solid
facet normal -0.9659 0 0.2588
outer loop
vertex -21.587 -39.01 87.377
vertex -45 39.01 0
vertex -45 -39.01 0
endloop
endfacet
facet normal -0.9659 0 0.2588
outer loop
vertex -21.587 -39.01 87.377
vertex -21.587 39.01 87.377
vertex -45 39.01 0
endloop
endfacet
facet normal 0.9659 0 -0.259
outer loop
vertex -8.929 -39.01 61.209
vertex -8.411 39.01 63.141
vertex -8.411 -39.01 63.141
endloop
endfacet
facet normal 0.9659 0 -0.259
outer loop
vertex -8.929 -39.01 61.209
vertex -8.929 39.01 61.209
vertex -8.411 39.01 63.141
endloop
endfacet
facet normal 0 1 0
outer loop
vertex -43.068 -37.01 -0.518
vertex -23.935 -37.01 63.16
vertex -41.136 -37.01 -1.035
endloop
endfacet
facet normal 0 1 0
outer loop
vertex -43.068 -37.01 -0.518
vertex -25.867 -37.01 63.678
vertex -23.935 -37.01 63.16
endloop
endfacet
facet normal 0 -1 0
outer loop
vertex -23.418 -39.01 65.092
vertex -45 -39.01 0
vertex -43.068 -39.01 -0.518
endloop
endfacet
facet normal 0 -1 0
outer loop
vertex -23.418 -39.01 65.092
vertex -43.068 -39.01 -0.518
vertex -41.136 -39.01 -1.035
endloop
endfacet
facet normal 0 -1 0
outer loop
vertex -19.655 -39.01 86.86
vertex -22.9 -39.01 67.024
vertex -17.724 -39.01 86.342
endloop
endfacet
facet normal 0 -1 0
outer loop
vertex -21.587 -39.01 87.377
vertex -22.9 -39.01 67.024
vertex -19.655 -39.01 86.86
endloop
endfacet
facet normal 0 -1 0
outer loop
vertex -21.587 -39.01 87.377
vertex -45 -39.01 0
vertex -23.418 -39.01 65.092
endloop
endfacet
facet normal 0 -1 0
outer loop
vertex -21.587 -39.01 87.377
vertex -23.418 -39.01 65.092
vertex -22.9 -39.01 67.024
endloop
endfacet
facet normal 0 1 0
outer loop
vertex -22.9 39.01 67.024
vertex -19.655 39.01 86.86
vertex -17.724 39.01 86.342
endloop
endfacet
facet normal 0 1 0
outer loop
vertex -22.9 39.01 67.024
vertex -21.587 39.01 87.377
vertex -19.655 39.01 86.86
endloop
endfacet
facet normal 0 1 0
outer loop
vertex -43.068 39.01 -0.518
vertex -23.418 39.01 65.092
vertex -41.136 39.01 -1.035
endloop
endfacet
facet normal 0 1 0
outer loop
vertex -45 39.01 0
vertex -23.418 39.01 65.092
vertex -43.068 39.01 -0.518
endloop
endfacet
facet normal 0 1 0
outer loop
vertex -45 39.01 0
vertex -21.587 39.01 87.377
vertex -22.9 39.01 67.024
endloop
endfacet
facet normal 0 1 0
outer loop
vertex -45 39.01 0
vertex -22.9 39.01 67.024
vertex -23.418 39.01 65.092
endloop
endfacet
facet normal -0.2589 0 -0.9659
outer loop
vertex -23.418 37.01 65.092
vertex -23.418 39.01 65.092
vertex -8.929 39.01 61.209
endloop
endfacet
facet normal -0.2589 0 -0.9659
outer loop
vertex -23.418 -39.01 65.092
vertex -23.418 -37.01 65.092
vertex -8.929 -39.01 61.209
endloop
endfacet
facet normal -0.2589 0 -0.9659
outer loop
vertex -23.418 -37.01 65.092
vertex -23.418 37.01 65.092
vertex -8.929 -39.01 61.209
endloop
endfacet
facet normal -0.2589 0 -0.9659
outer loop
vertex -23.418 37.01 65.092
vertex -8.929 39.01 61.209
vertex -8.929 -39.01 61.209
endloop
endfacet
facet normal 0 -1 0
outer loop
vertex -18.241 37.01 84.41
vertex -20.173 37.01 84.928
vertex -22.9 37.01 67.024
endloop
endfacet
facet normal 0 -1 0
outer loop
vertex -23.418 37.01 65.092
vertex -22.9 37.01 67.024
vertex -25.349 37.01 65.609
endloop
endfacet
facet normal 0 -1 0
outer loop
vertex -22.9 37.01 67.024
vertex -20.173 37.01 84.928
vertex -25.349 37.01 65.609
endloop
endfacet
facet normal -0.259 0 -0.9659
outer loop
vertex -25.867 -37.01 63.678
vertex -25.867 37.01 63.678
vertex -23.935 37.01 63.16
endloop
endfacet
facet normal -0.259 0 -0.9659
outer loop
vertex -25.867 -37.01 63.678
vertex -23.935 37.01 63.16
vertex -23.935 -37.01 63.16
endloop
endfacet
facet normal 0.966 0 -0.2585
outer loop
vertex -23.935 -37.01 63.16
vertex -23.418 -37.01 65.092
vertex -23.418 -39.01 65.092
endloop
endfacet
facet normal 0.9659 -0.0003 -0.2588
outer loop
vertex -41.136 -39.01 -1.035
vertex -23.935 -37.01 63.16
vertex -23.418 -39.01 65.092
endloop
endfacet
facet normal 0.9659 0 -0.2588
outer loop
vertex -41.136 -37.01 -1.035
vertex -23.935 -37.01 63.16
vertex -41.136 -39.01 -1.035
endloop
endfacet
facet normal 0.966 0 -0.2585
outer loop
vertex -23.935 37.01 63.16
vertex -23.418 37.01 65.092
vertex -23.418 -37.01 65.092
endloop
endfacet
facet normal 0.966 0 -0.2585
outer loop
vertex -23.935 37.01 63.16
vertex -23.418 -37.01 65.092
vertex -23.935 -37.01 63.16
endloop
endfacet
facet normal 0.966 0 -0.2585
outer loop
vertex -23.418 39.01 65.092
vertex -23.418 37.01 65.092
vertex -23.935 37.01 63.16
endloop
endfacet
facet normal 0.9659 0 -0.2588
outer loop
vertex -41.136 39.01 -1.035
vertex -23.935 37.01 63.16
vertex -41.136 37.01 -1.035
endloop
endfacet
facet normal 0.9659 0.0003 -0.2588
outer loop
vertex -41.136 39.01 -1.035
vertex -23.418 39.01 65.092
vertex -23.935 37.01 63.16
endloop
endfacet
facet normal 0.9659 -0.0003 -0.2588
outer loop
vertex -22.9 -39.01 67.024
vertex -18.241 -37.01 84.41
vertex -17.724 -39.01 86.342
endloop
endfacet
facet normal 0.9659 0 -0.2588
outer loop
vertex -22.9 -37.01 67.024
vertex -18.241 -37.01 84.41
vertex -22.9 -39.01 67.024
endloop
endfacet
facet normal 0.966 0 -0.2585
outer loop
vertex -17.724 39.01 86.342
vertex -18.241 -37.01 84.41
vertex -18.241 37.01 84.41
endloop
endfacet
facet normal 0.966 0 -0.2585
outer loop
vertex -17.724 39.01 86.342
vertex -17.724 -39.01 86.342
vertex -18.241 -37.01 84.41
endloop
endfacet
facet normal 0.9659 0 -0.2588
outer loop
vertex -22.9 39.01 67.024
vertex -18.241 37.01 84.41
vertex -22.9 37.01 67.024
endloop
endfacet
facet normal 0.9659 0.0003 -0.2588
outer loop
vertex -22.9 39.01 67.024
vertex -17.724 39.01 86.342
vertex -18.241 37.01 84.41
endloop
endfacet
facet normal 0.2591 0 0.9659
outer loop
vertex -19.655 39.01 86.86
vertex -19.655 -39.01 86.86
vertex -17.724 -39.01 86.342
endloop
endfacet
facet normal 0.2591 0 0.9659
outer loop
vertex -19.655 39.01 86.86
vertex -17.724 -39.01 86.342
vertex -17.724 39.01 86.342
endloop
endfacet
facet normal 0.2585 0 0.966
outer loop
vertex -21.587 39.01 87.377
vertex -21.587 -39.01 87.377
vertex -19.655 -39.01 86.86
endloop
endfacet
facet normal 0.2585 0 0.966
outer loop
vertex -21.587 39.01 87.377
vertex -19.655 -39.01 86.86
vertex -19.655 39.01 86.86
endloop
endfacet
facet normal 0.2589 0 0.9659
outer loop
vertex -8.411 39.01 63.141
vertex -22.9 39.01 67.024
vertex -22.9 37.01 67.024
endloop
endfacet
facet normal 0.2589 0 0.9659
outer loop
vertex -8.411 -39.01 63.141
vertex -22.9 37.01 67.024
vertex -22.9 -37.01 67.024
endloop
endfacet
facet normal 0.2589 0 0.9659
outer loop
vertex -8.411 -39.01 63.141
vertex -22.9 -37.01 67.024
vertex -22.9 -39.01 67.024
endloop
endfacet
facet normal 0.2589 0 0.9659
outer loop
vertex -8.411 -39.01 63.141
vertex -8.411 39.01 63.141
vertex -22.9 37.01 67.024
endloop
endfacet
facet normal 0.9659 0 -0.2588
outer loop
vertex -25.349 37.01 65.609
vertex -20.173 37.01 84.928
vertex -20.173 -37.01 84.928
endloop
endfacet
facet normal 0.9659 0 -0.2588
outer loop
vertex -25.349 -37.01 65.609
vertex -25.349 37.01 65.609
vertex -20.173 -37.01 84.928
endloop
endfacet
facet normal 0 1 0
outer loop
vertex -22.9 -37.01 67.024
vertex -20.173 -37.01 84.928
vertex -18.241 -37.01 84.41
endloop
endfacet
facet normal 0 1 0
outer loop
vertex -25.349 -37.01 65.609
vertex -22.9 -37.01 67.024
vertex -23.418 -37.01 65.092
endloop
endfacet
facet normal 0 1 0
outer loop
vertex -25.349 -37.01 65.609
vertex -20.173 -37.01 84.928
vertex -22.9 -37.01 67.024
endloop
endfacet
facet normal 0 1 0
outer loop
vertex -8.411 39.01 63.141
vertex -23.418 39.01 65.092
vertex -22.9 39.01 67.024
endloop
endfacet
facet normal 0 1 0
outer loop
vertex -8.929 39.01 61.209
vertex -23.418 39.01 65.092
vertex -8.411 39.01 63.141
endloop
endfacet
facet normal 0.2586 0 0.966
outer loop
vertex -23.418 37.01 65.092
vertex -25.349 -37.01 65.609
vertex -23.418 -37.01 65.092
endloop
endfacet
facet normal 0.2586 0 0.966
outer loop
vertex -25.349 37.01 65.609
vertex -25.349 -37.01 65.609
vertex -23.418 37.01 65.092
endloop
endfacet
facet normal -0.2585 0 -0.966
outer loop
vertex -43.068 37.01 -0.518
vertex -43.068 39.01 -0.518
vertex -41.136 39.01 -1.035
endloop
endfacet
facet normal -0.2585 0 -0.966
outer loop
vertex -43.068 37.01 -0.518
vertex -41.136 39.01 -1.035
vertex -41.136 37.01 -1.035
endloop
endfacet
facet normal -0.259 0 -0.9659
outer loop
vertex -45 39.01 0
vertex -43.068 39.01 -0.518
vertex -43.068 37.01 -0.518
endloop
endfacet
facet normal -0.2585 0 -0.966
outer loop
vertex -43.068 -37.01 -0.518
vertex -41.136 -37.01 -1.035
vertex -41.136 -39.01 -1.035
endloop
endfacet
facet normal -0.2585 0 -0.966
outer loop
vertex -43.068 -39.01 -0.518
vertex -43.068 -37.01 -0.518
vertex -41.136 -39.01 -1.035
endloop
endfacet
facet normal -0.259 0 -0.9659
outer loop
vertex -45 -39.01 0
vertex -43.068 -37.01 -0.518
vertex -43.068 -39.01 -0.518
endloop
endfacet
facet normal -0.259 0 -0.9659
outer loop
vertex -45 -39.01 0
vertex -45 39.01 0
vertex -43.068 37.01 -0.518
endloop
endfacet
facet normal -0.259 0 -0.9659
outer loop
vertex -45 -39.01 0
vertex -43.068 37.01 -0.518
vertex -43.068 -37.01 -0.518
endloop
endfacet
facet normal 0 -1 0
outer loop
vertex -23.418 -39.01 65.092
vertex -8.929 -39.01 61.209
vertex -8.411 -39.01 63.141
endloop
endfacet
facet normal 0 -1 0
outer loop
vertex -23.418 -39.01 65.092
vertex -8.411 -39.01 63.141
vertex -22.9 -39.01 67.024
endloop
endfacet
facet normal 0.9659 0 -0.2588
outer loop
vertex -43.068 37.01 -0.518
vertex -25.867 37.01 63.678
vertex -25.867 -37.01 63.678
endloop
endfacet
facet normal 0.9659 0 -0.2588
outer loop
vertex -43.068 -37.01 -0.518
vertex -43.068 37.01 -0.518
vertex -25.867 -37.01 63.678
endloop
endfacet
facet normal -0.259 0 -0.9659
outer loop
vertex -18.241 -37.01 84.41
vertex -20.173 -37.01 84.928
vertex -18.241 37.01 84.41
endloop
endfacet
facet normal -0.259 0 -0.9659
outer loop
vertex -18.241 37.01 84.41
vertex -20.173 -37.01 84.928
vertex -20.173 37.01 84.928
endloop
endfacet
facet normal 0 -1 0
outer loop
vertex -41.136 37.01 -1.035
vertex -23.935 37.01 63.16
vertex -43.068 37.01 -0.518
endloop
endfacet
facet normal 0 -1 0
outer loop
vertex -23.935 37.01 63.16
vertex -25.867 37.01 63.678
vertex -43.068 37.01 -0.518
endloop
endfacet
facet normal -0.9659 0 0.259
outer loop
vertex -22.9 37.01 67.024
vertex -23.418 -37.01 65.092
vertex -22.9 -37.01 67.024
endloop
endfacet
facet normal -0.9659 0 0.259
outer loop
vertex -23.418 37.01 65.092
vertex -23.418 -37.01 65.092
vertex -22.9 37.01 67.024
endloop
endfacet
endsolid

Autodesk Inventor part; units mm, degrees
ref_plane "YZ Plane" through (0, 0, 0) normal (1, 0, 0) x (0, 1, 0)
ref_plane "XZ Plane" through (0, 0, 0) normal (0, 1, 0) x (-1, 0, 0)
ref_plane "XY Plane" through (0, 0, 0) normal (0, 0, 1) x (1, 0, 0)
ref_plane "РабПлоскость1" through (-45, 39.0097, 0) normal (-0.9659258, 0, 0.258819) x (0, -1, 0)
sketch "Эскиз1" plane through (-45, 39.0097, 0) normal (-0.9659258, 0, 0.258819) x (0, -1, 0)
  line L0 (0, 0) -> (78.0194, 0) projected
  line L1 (0.0194, 85.4597) -> (78.0194, 85.4597) projected
  line L2 (78.0194, 68.8953) -> (78.0194, 85.4597) projected
  line L3 (-2.9723, 68.8953) -> (78.0194, 68.8953) projected
  line L4 (-2.9723, 68.8953) -> (-2.9723, 74.9718) projected
  ellipse E0 centre (-19.9806, 77.6951) end of major axis (0.0194, 77.6951) minor radius 5.1764 (-2.9723, 74.9718) -> (0.0194, 77.6951) ccw projected
  line L5 (0.0194, 80.2833) -> (0.0194, 77.6951) projected
  line L6 (0.0194, 80.2833) -> (0.0194, 85.4597) projected
  line L7 (0, 0) -> (78.0194, 0)
  line L8 (78.0194, 0) -> (78.0194, 90.4597)
  line L9 (78.0194, 90.4597) -> (0, 90.4597)
  line L10 (0, 90.4597) -> (0, 0)
  point P0 (39.0097, 11.6469)
  dimension "d1" = 5
extrude "Выдавливание1" add sketch "Эскиз1" against normal blind 2 contours L10 L3 L8 L0 | L10 E0 L5 L6 L1 L2 L3 | L10 L9 L8 L1 L6 L5 E0
sketch "Эскиз2" plane through (-43.0681, 39.0097, -0.5176) normal (0.9659258, 0, -0.258819) x (-0.258819, 0, -0.9659258)
  line L0 (0, 0) -> (0, -78.0194) projected
  line L1 (0, -78.0194) -> (-90.4597, -78.0194)
  line L2 (-90.4597, -78.0194) -> (-90.4597, -76.0194)
  line L3 (-90.4597, -76.0194) -> (0, -76.0194)
  line L4 (0, -76.0194) -> (0, -78.0194)
  line L5 (0, 0) -> (-90.4597, 0)
  line L6 (-90.4597, 0) -> (-90.4597, -2)
  line L7 (-90.4597, -2) -> (0, -2)
  line L8 (0, -2) -> (0, 0)
  line L9 (-90.4597, -78.0194) -> (-90.4597, 0) projected
  line L10 (-90.4597, -76.0194) -> (-88.4597, -76.0194)
  line L11 (-88.4597, -76.0194) -> (-88.4597, -2)
  line L12 (-88.4597, -2) -> (-90.4597, -2)
  line L13 (-90.4597, -2) -> (-90.4597, -76.0194)
  line L14 (-66.4597, -76.0194) -> (-68.4597, -76.0194)
  line L15 (-68.4597, -76.0194) -> (-68.4597, -2)
  line L16 (-68.4597, -2) -> (-66.4597, -2)
  line L17 (-66.4597, -2) -> (-66.4597, -76.0194)
  point P0 (-11.6469, -39.0097)
  point P1 (-90.4597, -1)
  point P2 (-90.4597, -77.0194)
  point P3 (-89.4597, -2)
  point P4 (-90.4597, -76.0194)
  point P5 (0, -76.0194)
  point P6 (-66.4597, -2)
  point P7 (0, -2)
  point P8 (-90.4597, -2)
  point P9 (-88.4597, -76.0194)
  point P10 (-88.4597, -2)
  dimension "d4" = 2
  dimension "d5" = 2
  dimension "d6" = 2
  dimension "d7" = 2
  dimension "d8" = 20
extrude "Выдавливание2" add sketch "Эскиз2" along normal blind 2 contours L0 L7 L6 L5 | L0 L1 L2 L3 | L17 L3 L15 L7 | L7 L11 L3 L9
ref_plane "РабПлоскость2" through (-23.4176, 37.0097, 65.0917) normal (0.258819, 0, 0.9659258) x (0, -1, 0)
sketch "Эскиз3" plane through (-23.4176, 37.0097, 65.0917) normal (0.258819, 0, 0.9659258) x (0, -1, 0)
  line L0 (-2, 0) -> (76.0194, 0) projected
  point P0 (37.0097, 39.4667)
sketch "Эскиз4" plane through (-23.4176, 37.0097, 65.0917) normal (0.258819, 0, 0.9659258) x (0, -1, 0)
  line L0 (76.0194, 0) -> (-2, 0)
  line L1 (-2, 0) -> (-2, 15)
  line L2 (-2, 15) -> (76.0194, 15)
  line L3 (76.0194, 15) -> (76.0194, 0)
  point P0 (37.0097, 39.4667)
  dimension "d12" = 15
extrude "Выдавливание3" add sketch "Эскиз4" along normal blind 2
properties part number "ДИ 00.00.09"
